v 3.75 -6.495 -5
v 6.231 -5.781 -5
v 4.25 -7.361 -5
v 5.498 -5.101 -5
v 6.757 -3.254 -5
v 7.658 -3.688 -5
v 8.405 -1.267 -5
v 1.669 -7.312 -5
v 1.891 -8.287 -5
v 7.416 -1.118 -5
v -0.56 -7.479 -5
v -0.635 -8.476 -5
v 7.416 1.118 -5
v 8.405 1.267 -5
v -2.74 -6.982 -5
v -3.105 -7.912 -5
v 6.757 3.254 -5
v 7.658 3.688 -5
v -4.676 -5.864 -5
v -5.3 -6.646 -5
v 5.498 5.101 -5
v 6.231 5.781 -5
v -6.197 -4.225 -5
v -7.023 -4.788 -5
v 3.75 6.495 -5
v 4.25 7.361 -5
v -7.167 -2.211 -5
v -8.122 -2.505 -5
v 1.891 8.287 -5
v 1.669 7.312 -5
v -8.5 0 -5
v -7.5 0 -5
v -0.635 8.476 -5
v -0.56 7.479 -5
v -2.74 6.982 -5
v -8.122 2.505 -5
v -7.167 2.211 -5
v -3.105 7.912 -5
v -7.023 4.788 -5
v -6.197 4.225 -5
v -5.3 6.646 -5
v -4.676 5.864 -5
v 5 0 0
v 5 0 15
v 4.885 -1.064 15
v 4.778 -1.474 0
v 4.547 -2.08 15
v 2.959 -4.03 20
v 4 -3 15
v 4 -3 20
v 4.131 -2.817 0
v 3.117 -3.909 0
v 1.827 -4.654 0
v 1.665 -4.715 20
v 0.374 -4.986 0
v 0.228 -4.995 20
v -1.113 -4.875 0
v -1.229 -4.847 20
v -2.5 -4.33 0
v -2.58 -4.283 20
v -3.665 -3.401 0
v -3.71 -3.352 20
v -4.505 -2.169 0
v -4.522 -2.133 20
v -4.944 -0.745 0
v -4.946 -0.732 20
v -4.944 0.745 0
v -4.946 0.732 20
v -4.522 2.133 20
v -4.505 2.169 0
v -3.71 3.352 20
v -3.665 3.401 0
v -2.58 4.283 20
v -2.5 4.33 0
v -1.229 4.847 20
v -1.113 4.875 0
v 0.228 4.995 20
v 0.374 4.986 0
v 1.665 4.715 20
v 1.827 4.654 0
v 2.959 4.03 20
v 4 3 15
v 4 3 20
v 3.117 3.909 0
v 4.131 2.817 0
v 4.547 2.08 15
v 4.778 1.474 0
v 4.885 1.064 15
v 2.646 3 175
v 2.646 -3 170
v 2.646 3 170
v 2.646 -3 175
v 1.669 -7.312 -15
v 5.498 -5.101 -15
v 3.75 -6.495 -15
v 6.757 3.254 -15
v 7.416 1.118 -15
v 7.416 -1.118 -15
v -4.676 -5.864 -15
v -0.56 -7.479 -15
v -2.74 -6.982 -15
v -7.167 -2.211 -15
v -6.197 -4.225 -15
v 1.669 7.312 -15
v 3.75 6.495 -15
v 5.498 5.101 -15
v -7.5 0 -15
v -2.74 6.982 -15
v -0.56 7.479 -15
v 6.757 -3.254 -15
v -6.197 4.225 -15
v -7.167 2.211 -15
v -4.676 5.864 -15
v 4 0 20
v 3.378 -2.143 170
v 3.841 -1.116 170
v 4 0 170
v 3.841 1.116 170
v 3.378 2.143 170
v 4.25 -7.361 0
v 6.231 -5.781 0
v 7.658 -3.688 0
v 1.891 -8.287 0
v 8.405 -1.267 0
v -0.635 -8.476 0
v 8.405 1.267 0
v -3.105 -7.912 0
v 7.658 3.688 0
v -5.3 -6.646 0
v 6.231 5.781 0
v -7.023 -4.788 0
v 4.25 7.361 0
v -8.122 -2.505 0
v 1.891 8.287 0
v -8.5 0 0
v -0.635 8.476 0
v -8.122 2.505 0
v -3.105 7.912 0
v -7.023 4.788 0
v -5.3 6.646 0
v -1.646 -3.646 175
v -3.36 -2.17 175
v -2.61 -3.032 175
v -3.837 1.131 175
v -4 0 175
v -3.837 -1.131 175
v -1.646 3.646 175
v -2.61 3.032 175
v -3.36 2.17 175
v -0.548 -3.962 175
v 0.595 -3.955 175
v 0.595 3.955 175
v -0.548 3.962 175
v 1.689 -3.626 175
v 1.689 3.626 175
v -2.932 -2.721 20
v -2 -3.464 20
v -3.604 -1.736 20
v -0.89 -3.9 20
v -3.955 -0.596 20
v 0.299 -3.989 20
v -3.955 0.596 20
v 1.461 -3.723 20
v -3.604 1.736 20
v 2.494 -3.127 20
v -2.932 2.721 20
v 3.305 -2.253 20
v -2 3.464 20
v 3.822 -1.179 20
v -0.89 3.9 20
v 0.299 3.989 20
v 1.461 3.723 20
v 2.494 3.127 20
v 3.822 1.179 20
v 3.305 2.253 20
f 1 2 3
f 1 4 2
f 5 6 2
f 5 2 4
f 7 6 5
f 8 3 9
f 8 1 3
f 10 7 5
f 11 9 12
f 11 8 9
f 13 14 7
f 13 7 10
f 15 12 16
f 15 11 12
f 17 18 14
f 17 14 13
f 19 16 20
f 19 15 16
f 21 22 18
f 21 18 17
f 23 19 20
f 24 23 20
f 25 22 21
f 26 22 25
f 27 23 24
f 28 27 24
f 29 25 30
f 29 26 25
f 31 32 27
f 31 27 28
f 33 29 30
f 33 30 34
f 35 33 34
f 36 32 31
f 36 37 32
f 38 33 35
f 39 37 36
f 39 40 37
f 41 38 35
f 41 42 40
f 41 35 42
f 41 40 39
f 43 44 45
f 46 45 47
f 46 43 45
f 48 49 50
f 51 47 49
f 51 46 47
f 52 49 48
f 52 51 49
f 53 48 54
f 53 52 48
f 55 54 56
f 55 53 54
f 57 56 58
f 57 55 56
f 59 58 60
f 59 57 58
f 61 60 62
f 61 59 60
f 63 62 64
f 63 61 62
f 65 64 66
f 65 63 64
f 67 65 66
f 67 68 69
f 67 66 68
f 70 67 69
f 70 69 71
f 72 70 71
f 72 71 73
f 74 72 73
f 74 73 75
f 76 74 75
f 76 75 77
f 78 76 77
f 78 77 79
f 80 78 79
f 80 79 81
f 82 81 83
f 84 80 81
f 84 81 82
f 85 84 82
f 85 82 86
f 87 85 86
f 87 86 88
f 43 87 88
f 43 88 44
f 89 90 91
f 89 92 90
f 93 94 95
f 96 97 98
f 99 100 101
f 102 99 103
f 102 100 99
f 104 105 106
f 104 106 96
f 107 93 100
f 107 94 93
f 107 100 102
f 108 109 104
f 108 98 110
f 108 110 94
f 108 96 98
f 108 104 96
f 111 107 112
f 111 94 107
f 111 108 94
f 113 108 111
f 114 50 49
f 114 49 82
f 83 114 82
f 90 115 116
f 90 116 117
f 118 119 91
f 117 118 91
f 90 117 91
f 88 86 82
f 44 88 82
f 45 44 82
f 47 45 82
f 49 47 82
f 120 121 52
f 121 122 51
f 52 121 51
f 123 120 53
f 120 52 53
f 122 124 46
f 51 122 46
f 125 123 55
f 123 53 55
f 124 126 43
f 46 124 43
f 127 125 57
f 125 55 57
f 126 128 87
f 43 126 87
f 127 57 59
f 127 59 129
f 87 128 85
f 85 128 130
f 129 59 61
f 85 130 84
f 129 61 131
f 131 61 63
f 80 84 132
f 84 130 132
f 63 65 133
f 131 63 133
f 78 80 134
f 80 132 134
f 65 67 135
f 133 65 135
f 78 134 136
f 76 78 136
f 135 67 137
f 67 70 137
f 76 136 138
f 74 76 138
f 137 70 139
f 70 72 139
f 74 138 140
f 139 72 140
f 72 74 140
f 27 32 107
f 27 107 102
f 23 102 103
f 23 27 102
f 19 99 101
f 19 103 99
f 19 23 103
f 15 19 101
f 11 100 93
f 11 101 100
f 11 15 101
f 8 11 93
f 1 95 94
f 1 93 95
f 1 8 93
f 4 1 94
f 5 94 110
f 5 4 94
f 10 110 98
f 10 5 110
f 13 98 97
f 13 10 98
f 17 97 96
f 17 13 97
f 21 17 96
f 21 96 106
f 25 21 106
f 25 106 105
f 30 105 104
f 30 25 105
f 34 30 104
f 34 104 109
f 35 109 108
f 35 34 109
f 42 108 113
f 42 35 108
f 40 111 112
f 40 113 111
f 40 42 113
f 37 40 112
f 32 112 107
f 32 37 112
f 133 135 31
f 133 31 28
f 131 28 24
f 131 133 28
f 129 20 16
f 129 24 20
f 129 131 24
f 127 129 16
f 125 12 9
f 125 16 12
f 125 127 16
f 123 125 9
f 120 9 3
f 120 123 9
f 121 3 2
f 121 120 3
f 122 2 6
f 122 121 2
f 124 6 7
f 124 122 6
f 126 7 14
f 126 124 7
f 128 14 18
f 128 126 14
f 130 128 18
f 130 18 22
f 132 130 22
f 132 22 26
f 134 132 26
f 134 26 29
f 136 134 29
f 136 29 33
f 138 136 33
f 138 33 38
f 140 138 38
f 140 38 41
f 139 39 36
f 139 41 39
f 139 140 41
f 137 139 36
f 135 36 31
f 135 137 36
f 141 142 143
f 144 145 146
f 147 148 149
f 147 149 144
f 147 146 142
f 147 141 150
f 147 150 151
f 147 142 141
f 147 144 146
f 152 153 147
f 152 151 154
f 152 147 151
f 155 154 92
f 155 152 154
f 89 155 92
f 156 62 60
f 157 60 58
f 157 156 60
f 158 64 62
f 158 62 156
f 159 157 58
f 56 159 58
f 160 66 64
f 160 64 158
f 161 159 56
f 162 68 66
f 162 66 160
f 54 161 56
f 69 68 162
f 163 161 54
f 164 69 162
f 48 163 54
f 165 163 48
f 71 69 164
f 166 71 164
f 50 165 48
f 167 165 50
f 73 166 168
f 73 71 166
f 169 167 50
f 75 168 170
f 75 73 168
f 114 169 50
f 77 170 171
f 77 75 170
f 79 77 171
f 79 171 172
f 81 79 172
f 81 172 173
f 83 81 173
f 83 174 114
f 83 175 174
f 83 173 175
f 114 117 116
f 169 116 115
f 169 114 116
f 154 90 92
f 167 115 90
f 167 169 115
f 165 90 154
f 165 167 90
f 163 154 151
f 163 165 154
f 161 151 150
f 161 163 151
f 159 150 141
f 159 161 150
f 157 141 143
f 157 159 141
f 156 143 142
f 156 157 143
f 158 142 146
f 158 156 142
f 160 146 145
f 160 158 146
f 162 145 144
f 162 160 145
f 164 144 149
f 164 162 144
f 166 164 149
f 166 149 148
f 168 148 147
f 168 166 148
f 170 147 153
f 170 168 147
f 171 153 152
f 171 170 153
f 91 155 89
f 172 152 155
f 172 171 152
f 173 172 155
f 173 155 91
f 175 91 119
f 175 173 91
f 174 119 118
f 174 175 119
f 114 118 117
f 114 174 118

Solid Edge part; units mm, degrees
sketch "Sketch1" plane through (0, 0, 0) normal (0, 0, 1) x (1, 0, 0)
  circle A0 centre (0, 0) radius 5
extrude "Protrusion1" add sketch "Sketch1" along normal blind 20
sketch "Sketch2" plane through (0, 0, 20) normal (0, 0, 1) x (1, 0, 0)
  circle A0 centre (0, 0) radius 4
extrude "ExtrudedProtrusion_2" add sketch "Sketch2" along normal blind 155
sketch "Sketch3" plane through (0, 0, 20) normal (0, 0, 1) x (0, -1, 0)
  line L0 (-3.8216, 6.2347) -> (3.8216, 6.2347)
  line L1 (3.8216, 6.2347) -> (3.8216, 4)
  line L2 (3.8216, 4) -> (0, 4)
  line L3 (0, 4) -> (-3.8216, 4)
  line L4 (-3.8216, 4) -> (-3.8216, 6.2347)
extrude "ExtrudedCutout_1" cut sketch "Sketch3" against normal blind 5
sketch "Sketch4" plane through (0, 0, 175) normal (0, 0, 1) x (0, -1, 0)
  line L0 (-3.2306, 4) -> (4.2507, 4)
  line L1 (4.2507, 4) -> (4.2507, 2.6458)
  line L2 (4.2507, 2.6458) -> (0, 2.6458)
  line L3 (0, 2.6458) -> (-3.2306, 2.6458)
  line L4 (-3.2306, 2.6458) -> (-3.2306, 4)
extrude "ExtrudedCutout_2" cut sketch "Sketch4" against normal blind 5
sketch "Sketch5" plane through (0, 0, 0) normal (0, 0, -1) x (-1, 0, 0)
  circle A0 centre (0, 0) radius 8.5
extrude "ExtrudedProtrusion_6" add sketch "Sketch5" along normal blind 5
sketch "Sketch6" plane through (0, 0, -5) normal (0, 0, -1) x (-1, 0, 0)
  circle A0 centre (0, 0) radius 7.5
extrude "ExtrudedProtrusion_7" add sketch "Sketch6" along normal blind 10
